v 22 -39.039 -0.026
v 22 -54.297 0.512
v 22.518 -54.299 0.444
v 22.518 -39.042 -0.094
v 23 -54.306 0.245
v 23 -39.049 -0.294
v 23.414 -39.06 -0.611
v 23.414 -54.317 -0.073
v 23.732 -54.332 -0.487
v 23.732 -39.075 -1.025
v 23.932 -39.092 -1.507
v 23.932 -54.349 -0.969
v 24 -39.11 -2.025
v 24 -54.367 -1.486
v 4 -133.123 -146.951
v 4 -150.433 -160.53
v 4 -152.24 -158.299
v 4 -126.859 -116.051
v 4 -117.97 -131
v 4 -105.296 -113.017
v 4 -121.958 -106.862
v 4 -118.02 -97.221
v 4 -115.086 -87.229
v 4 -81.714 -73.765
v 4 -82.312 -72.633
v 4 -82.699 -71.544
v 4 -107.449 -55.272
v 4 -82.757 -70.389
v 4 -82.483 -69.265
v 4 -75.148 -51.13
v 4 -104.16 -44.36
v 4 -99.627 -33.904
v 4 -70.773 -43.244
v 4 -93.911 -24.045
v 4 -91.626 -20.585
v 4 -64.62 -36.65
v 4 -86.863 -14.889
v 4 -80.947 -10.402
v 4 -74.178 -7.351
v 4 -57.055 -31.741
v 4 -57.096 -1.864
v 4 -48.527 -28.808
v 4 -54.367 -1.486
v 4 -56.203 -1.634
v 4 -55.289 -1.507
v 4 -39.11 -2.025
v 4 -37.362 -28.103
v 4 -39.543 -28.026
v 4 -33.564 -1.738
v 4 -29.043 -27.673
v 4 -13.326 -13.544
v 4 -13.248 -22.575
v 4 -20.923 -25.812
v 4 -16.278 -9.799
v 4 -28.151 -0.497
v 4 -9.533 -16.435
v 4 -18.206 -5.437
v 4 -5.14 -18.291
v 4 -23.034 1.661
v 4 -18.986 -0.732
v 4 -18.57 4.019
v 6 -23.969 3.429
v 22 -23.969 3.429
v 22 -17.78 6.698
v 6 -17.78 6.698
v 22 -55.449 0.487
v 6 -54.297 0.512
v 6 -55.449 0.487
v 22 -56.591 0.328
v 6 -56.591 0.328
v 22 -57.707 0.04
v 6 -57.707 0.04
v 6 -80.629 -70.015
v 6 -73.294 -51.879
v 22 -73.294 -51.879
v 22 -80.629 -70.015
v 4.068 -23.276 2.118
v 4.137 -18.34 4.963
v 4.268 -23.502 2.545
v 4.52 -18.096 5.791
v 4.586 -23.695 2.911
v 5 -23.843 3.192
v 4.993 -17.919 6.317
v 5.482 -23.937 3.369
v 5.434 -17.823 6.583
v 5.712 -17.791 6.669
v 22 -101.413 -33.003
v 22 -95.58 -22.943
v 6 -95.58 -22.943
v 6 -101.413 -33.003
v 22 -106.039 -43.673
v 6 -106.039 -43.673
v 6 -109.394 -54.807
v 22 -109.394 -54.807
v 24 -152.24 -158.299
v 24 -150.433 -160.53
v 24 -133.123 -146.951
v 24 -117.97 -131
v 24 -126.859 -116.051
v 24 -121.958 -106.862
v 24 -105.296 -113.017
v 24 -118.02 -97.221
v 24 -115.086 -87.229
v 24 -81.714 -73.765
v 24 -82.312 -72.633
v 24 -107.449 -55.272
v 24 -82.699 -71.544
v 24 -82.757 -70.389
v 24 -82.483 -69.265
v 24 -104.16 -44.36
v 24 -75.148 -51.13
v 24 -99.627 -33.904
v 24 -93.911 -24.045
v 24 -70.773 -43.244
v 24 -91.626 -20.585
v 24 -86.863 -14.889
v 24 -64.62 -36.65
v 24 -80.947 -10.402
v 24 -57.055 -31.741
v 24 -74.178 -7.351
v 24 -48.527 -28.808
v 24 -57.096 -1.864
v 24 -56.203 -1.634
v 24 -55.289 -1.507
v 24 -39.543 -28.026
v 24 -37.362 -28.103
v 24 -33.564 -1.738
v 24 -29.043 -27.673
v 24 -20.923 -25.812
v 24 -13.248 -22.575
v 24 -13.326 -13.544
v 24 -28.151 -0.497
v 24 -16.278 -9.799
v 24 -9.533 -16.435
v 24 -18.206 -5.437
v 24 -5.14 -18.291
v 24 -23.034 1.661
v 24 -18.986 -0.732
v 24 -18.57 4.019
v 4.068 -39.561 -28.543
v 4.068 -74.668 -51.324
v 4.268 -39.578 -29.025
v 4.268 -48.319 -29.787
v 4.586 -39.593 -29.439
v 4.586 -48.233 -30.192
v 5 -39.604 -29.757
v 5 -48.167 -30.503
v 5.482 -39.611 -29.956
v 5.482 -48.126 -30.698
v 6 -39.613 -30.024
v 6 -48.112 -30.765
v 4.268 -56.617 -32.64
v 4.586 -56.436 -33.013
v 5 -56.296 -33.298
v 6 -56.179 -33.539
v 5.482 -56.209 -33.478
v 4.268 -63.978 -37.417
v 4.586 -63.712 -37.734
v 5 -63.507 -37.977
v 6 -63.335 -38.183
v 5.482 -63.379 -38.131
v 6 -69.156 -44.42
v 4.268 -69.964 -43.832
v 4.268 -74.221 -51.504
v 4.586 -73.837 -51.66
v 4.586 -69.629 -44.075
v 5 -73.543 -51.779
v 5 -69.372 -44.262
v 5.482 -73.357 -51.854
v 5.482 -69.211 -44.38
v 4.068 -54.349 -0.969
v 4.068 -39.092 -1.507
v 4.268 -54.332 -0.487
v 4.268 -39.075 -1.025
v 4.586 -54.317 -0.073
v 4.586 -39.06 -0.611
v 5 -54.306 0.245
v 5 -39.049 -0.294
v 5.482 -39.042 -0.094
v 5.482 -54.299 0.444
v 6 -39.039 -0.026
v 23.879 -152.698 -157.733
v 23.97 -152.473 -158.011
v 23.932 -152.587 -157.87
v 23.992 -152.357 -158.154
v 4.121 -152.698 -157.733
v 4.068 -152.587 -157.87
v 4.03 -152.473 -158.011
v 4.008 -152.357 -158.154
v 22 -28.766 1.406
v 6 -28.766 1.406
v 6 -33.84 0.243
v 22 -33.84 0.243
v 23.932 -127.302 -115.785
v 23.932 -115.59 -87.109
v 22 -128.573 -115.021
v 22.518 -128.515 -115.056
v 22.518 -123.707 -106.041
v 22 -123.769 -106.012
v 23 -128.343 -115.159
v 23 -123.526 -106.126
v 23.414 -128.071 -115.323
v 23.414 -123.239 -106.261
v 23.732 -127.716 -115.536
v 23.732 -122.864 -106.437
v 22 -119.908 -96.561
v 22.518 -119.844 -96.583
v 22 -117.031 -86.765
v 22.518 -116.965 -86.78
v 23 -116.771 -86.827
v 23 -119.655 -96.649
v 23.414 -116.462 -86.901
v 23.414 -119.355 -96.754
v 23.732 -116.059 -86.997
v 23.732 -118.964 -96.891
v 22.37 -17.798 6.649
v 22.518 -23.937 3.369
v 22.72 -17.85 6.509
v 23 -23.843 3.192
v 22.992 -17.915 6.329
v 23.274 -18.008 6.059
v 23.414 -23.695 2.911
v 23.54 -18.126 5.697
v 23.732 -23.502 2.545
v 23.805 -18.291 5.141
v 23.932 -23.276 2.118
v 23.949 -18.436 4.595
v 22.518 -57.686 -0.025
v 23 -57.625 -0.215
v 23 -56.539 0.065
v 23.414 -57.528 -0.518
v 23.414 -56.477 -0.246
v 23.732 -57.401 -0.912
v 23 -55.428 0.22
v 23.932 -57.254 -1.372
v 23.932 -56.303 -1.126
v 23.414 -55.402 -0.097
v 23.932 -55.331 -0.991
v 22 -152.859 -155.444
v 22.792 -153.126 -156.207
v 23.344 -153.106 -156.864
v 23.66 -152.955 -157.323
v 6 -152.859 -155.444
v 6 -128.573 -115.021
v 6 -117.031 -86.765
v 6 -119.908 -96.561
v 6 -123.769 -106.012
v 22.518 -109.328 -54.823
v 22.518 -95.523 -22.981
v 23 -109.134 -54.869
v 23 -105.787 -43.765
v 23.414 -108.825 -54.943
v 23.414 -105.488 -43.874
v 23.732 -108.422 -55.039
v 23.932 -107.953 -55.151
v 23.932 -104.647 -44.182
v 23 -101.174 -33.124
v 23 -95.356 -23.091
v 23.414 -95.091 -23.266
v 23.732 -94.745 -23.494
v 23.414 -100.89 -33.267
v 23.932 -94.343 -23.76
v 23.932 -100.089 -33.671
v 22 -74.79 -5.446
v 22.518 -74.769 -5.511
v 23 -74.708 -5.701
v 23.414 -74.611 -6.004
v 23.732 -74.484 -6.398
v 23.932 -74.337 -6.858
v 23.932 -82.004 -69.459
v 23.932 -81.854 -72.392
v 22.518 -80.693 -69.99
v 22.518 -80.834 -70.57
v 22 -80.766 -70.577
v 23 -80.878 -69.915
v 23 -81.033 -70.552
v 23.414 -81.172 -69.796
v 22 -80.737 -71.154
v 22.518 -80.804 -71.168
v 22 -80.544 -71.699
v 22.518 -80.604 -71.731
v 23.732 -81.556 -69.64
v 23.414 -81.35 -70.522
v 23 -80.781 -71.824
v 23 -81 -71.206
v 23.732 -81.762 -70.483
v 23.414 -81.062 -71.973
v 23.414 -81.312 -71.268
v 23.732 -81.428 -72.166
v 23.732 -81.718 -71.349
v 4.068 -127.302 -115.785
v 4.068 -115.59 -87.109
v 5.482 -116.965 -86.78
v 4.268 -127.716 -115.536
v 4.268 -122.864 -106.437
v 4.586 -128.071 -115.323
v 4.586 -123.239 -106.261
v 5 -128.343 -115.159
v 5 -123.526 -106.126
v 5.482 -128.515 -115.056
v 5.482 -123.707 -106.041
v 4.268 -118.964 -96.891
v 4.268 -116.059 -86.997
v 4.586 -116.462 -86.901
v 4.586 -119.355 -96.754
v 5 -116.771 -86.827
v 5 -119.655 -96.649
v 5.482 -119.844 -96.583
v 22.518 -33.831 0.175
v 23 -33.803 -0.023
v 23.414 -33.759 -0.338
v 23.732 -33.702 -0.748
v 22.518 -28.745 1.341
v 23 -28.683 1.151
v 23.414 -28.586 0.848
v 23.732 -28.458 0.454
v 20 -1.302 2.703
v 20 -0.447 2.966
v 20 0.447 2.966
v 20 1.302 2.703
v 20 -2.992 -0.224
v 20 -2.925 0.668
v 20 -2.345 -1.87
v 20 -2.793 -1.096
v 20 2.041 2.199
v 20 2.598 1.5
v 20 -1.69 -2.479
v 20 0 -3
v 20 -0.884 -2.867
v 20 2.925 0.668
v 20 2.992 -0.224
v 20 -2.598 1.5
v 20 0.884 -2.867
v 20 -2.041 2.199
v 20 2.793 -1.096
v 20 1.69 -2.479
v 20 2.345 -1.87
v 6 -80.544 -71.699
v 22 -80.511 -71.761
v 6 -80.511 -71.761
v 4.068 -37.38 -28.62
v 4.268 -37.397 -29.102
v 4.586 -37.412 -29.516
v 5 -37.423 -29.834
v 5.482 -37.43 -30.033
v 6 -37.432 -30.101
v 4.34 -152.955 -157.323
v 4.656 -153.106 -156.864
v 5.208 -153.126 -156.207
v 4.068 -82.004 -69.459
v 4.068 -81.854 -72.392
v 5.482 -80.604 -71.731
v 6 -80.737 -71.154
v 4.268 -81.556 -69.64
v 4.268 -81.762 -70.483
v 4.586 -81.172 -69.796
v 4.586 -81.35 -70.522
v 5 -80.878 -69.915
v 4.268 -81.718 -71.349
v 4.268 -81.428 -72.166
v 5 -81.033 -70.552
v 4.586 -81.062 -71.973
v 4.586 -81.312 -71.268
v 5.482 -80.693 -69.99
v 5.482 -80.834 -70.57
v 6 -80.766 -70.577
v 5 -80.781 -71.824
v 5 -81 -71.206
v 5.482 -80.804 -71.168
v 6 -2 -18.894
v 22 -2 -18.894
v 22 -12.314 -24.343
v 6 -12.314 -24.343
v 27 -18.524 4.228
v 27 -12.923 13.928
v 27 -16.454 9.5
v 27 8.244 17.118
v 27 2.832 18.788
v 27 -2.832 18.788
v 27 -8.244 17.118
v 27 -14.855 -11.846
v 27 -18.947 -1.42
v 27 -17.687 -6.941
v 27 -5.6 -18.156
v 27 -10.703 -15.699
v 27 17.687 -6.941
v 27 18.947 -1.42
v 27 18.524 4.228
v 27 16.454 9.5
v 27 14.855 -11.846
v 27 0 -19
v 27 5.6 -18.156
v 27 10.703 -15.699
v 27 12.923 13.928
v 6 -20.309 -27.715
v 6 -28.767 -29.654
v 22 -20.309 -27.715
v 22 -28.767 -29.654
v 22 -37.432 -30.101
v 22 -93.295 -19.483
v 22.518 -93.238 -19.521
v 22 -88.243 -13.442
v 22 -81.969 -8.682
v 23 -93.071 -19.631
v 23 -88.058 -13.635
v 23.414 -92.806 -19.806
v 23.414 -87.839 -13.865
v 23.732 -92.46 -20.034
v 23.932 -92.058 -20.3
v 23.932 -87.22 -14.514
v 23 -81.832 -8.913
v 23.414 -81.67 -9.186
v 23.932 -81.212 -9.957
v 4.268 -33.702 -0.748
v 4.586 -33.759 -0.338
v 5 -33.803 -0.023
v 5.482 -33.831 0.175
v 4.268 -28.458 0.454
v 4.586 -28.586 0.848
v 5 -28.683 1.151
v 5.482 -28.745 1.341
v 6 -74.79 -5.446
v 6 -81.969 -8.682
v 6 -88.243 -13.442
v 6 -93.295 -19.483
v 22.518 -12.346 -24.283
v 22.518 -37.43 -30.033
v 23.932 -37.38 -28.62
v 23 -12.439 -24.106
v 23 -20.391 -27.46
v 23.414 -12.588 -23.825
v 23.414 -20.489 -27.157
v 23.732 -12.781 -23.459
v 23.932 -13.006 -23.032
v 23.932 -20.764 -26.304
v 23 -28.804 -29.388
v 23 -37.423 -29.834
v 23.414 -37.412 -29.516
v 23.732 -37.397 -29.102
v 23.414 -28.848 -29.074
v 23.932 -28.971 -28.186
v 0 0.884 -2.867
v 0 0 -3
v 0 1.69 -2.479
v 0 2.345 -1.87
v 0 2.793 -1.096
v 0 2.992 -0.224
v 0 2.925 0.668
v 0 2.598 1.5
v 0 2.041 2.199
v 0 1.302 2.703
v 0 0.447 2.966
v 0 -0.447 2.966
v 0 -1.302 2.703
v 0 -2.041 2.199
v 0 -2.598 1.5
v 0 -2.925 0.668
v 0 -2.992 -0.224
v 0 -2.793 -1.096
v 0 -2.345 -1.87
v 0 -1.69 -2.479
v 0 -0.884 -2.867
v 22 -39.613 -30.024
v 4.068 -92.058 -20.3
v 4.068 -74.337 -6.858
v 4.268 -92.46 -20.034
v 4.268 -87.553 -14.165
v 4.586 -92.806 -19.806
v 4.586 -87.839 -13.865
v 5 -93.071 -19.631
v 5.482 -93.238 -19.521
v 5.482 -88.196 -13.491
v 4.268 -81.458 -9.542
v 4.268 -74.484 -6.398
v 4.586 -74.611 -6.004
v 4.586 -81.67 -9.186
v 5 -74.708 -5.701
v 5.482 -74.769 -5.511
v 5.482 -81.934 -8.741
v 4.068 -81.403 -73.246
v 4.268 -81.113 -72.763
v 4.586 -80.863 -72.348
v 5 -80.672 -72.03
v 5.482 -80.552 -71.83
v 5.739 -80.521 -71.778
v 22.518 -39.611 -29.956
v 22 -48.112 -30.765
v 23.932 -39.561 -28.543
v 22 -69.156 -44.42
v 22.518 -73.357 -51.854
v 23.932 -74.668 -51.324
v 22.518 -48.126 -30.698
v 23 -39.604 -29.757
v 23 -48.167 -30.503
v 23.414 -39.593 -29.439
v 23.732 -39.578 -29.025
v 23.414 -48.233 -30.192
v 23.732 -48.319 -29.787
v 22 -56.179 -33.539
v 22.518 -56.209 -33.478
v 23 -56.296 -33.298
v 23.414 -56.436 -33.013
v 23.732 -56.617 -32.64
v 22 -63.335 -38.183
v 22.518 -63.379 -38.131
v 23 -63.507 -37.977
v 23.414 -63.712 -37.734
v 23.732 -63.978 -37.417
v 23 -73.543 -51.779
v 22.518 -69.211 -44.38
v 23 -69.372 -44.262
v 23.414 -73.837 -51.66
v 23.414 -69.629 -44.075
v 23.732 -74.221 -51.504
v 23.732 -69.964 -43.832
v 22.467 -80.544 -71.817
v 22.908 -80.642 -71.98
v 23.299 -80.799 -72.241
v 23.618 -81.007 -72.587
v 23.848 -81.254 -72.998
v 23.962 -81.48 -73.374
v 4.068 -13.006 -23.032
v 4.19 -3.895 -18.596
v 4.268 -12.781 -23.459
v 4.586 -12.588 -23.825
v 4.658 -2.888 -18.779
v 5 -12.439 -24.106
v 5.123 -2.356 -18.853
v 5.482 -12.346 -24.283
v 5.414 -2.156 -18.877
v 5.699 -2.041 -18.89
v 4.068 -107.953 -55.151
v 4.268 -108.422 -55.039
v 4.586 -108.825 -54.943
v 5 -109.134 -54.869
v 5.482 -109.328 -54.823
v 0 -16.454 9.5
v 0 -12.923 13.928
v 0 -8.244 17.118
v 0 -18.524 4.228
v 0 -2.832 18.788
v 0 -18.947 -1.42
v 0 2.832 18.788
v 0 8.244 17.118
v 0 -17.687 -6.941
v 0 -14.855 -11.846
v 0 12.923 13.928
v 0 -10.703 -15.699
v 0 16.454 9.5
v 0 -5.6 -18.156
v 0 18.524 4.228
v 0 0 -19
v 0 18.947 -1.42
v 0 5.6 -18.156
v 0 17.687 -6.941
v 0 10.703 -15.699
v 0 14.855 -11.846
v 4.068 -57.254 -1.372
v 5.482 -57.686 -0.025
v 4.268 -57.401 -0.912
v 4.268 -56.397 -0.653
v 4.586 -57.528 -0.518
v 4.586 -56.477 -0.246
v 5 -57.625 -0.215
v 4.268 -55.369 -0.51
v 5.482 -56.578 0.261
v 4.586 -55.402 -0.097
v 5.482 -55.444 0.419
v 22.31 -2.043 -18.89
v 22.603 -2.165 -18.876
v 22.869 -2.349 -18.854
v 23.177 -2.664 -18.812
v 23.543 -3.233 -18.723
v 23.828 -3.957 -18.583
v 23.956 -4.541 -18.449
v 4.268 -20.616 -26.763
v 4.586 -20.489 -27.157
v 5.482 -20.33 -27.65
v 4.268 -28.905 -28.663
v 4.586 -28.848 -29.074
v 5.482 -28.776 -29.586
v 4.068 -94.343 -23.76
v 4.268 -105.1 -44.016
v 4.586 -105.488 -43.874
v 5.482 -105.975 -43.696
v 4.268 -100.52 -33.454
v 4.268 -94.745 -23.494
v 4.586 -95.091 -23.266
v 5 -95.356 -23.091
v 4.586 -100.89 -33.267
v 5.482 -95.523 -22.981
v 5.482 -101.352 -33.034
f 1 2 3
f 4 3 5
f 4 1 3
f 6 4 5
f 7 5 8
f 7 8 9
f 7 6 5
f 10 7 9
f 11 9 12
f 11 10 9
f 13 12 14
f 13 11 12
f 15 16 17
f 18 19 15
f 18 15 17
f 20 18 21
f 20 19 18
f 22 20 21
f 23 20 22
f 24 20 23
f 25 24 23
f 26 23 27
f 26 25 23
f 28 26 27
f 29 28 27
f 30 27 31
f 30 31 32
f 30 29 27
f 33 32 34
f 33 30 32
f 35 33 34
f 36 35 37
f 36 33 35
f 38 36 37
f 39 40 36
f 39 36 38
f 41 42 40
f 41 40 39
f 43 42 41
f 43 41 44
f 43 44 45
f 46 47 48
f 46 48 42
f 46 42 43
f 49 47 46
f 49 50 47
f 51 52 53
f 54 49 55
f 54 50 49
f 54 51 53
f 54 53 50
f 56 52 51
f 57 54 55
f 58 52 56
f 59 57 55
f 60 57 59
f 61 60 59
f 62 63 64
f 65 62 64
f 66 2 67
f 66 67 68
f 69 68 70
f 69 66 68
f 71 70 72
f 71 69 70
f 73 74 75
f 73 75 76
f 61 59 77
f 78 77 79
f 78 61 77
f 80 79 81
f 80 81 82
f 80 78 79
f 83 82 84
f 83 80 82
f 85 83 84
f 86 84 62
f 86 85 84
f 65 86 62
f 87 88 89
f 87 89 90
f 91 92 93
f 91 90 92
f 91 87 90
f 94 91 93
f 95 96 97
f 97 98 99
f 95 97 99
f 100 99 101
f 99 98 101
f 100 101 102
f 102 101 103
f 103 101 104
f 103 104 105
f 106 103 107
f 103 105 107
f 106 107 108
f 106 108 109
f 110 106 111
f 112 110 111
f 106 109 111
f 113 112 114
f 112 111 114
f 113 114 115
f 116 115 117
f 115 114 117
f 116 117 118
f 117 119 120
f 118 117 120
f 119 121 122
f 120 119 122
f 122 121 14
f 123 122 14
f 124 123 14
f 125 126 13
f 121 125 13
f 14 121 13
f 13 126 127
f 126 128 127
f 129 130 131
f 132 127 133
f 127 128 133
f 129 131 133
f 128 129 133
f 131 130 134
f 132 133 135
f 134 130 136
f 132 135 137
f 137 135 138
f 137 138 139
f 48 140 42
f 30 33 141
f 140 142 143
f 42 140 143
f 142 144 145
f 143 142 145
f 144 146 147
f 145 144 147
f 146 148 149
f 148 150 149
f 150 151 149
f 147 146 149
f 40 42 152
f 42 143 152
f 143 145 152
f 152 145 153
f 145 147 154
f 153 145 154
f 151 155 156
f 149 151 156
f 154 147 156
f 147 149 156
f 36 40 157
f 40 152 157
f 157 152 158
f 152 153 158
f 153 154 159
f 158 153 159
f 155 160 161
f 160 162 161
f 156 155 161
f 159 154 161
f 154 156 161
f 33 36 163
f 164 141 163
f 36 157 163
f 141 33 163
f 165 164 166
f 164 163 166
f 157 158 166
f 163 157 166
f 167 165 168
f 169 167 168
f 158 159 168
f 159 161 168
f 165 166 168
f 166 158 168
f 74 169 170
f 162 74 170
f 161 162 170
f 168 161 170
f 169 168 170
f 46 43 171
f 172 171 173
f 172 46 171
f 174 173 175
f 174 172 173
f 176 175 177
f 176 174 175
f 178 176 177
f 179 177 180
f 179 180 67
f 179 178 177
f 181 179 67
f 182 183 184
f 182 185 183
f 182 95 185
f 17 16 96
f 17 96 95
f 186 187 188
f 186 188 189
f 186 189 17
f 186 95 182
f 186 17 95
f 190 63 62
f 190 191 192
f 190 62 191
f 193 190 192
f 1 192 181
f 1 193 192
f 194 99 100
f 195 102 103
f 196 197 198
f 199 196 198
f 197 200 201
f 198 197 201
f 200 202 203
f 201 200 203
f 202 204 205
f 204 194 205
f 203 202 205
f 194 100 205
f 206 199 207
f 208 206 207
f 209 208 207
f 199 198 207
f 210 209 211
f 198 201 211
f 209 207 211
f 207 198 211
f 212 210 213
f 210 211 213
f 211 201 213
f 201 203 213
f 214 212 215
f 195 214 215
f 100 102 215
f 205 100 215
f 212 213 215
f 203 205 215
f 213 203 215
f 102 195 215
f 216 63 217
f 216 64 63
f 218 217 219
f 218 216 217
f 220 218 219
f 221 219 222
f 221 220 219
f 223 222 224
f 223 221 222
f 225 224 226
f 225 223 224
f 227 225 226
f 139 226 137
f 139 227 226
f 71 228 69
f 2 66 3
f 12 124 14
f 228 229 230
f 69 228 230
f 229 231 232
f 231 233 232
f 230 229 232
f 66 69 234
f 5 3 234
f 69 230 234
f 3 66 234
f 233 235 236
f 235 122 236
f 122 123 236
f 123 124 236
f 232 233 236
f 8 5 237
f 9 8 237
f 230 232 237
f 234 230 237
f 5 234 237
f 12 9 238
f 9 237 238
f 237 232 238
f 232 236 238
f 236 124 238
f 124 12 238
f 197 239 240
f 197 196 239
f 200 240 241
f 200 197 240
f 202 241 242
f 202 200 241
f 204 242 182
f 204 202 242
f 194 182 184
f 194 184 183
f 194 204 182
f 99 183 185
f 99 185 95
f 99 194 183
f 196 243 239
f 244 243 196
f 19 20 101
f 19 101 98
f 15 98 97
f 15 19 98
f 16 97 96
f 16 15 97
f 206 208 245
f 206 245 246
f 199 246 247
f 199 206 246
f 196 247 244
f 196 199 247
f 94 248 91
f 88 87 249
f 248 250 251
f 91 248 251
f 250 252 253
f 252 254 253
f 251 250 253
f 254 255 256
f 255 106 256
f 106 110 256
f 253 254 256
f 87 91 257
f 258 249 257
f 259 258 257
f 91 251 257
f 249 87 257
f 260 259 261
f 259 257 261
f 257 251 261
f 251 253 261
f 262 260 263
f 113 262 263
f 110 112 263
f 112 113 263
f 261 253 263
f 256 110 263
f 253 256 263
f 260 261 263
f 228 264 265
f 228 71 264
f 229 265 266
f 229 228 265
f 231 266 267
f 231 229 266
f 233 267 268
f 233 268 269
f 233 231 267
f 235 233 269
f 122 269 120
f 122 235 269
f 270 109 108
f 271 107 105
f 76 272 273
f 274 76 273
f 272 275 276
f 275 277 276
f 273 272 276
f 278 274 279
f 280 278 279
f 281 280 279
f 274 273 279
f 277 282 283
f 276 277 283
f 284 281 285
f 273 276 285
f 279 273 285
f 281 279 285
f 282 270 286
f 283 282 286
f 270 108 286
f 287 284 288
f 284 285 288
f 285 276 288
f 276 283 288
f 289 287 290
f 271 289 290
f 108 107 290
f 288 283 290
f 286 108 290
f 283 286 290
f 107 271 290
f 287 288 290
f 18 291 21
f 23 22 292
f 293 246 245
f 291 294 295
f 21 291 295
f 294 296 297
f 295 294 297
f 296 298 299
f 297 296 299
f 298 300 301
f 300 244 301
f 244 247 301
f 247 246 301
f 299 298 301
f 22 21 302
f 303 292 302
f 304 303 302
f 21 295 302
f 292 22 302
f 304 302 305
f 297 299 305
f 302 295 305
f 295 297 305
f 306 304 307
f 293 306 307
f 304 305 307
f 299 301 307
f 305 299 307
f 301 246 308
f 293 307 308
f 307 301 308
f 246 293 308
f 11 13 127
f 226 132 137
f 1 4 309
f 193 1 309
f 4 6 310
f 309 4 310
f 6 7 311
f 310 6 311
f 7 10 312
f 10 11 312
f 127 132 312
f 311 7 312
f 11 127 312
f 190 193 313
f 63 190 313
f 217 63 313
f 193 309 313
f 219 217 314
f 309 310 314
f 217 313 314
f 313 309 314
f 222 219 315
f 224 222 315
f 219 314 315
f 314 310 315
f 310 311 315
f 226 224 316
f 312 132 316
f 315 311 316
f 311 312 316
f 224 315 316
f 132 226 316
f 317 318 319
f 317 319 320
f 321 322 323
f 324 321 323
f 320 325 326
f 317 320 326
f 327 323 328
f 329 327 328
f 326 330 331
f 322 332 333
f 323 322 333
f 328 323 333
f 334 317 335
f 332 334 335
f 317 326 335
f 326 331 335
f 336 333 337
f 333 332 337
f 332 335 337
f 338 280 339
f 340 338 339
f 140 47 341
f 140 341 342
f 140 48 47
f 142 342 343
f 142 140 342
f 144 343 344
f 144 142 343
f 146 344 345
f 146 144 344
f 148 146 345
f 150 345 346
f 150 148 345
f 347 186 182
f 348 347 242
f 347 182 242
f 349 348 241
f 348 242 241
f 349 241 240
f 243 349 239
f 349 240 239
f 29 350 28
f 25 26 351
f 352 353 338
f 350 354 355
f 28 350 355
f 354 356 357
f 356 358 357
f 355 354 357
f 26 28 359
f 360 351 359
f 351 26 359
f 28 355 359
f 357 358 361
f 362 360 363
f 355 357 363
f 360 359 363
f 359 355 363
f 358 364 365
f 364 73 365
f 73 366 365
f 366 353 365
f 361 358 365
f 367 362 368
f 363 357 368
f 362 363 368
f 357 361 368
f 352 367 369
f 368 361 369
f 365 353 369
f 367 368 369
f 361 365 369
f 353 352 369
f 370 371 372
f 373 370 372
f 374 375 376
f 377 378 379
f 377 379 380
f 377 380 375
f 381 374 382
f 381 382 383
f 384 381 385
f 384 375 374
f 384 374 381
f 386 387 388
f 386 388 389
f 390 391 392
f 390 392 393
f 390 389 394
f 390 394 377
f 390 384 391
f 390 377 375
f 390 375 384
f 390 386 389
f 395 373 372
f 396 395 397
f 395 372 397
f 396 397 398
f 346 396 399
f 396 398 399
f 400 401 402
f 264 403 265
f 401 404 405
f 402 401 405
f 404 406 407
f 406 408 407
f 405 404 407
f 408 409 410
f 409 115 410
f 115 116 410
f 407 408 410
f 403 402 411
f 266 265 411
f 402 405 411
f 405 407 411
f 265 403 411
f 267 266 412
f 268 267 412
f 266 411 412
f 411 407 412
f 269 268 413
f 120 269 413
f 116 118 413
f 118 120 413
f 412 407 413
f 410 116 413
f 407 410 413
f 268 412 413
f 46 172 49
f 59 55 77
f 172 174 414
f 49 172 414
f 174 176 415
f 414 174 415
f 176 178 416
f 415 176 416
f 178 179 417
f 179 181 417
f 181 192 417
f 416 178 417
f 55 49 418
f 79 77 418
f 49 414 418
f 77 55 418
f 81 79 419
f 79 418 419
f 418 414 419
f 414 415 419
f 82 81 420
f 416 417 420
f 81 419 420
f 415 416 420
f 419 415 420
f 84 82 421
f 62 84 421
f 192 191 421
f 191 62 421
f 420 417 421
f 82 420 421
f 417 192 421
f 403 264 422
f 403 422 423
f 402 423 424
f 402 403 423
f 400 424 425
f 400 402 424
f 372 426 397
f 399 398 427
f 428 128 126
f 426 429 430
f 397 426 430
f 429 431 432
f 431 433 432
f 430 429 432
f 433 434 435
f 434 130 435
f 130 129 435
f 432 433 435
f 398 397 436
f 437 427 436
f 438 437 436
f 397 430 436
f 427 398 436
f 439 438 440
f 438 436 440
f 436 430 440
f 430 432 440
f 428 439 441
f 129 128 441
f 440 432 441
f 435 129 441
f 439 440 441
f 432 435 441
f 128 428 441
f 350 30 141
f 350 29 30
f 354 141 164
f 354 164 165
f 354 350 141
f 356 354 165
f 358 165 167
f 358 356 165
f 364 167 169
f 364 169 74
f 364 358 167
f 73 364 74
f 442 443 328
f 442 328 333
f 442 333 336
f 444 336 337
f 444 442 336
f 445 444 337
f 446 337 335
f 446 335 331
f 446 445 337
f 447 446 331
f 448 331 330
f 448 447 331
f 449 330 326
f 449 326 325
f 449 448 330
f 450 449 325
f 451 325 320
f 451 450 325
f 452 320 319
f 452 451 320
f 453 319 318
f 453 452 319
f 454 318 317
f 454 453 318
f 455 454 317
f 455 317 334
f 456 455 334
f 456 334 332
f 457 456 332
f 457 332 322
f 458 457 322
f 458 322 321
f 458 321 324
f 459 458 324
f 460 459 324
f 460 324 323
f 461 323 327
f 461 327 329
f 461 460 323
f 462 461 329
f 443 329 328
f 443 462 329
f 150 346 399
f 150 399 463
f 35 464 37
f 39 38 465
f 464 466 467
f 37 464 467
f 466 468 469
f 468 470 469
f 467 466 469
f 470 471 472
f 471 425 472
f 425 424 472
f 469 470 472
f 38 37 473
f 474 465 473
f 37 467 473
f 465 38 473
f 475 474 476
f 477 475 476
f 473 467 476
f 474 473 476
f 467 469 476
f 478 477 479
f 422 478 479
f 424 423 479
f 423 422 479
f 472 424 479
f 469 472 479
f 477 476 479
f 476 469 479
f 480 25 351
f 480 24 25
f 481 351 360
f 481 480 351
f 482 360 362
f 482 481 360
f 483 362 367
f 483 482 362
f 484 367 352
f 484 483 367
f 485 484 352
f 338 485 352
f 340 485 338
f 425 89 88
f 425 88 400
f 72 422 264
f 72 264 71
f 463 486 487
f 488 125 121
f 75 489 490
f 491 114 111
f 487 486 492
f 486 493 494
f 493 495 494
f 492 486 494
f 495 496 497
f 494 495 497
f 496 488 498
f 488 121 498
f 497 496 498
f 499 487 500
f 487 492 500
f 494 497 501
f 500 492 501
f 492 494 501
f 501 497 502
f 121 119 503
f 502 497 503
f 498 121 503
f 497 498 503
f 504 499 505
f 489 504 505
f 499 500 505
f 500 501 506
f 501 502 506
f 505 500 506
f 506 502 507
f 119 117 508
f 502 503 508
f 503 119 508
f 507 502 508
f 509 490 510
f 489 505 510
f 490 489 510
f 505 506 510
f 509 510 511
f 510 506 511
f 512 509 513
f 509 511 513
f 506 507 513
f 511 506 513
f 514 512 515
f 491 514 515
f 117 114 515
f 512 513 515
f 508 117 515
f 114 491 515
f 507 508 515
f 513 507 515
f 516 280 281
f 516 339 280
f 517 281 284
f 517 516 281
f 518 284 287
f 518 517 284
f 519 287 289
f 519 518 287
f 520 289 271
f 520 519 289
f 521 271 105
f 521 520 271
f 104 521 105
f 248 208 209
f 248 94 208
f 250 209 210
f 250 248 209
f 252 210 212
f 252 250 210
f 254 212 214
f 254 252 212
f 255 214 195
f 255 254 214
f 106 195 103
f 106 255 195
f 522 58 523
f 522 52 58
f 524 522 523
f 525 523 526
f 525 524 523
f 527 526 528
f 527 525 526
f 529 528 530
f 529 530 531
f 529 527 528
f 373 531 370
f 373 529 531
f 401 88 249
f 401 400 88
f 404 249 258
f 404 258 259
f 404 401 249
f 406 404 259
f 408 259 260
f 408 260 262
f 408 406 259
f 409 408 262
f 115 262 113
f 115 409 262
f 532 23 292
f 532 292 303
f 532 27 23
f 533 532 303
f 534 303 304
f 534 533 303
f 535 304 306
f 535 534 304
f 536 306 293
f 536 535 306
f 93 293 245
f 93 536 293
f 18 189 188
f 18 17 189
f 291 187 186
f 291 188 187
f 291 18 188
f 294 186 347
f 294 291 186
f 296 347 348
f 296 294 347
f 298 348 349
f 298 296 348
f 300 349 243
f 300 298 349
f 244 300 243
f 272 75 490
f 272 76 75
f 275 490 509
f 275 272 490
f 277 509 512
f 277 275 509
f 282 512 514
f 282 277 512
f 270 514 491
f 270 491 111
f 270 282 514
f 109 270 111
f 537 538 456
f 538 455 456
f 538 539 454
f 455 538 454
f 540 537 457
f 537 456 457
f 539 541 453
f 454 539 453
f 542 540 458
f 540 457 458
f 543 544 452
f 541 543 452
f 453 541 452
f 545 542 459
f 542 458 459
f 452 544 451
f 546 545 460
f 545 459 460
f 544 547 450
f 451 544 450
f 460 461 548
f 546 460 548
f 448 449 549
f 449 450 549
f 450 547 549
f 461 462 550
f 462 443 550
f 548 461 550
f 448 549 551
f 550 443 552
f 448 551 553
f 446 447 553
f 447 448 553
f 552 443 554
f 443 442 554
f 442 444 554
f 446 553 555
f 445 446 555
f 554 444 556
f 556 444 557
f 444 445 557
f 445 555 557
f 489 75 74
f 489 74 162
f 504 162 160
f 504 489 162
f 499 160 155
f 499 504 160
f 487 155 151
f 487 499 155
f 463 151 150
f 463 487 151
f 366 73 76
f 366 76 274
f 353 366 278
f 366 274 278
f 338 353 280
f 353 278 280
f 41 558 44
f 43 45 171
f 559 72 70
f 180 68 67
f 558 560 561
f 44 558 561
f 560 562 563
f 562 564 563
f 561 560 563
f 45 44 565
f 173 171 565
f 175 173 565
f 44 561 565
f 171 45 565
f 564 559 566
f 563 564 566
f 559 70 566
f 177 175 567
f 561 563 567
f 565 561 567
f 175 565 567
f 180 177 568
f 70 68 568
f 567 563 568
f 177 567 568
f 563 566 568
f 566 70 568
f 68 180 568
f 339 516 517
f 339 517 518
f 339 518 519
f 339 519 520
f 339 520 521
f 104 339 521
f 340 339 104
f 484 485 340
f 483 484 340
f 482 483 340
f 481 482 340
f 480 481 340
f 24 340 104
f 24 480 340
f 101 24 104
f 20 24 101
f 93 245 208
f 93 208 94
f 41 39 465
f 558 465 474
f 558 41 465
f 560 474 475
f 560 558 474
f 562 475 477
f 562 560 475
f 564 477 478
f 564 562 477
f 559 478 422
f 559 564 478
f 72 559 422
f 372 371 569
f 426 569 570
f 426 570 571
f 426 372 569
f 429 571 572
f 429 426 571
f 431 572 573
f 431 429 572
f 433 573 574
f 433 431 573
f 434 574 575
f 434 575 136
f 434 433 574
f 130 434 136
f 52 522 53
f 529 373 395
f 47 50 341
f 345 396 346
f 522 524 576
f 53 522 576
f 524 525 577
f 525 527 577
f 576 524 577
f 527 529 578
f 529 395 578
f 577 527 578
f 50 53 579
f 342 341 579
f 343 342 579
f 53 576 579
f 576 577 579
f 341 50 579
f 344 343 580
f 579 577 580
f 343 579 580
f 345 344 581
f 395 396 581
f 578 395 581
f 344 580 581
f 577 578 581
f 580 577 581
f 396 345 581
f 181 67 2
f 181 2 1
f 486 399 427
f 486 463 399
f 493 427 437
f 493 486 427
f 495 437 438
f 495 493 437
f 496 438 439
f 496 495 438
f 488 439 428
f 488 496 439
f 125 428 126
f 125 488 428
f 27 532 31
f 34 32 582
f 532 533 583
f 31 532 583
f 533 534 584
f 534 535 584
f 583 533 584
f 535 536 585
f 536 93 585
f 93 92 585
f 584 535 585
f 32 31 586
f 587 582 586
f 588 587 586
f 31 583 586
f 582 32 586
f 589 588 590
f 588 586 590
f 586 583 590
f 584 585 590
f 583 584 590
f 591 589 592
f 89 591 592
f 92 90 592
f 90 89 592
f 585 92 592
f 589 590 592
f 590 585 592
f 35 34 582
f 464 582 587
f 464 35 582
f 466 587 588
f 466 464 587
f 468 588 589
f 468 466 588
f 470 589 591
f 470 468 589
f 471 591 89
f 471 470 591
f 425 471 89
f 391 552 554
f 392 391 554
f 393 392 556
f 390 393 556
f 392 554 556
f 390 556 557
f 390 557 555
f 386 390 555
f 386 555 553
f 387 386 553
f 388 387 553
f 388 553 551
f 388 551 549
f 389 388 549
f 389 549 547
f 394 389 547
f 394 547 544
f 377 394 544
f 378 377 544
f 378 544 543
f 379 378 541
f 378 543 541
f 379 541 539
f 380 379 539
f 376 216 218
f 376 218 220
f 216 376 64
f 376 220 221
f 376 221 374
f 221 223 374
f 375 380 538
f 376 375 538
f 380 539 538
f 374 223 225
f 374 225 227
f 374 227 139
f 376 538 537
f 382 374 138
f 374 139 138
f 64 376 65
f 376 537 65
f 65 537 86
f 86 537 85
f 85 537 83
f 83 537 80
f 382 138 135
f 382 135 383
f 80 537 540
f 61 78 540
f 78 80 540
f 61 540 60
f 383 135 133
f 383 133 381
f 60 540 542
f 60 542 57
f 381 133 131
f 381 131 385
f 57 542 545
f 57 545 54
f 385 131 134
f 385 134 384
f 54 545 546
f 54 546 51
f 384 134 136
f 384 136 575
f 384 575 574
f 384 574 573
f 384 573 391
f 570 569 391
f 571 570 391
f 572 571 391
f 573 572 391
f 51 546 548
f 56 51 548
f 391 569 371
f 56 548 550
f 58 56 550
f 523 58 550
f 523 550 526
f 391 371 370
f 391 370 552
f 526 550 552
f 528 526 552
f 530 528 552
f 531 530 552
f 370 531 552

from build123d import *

# Parameters (mm, degrees)
SKETCH1_R           = 19
BOSS_EXTRUDE1_DEPTH = 27
CUT_EXTRUDE1_START  = -27
SKETCH2_R           = 3
CUT_EXTRUDE1_DEPTH  = 20
BOSS_EXTRUDE2_START = 4
BOSS_EXTRUDE2_DEPTH = 20
FILLET1_R           = 50
FILLET2_R           = 30
FILLET3_R           = 10
FILLET4_R           = 35
FILLET5_R           = 100
FILLET6_R           = 35
FILLET7_R           = 2
FILLET8_R           = 2


with BuildPart() as part:
    # Sketch1 → Boss-Extrude1 (new body)
    with BuildSketch(Plane(origin=(0, 0, 0), x_dir=(0, 0, -1), z_dir=(1, 0, 0))):
        Circle(SKETCH1_R)
    extrude(amount=BOSS_EXTRUDE1_DEPTH)

    # Sketch2 → Cut-Extrude1 (cut)
    with BuildSketch(Plane(origin=(27, 0, 0), x_dir=(0, 0, -1), z_dir=(1, 0, 0)).offset(CUT_EXTRUDE1_START)):
        Circle(SKETCH2_R)
    extrude(amount=CUT_EXTRUDE1_DEPTH, mode=Mode.SUBTRACT)

    # Sketch3 → Boss-Extrude2 (add)
    with BuildSketch(Plane(origin=(0, 0, 0), x_dir=(0, 0, -1), z_dir=(1, 0, 0)).offset(BOSS_EXTRUDE2_START)):
        with BuildLine():
            Line((18.894443628, -2), (30.571757329, -24.105210805))
            Line((30.571757329, -24.105210805), (29.160101789, -64.105210805))
            Line((29.160101789, -64.105210805), (70.877132442, -80.977950757))
            Line((70.877132442, -80.977950757), (71.761340874, -80.510858209))
            Line((71.761340874, -80.510858209), (113.01650789, -105.296253694))
            ThreePointArc((113.01650789, -105.296253694), (139.2516778, -125.255736415), (160.530160786, -150.432933488))
            Line((160.530160786, -150.432933488), (156.644610862, -153.579757568))
            Line((156.644610862, -153.579757568), (101.784019397, -120.620456846))
            Line((101.784019397, -120.620456846), (37.657121196, -105.296253694))
            Line((37.657121196, -105.296253694), (9.210363464, -86.510744513))
            Line((9.210363464, -86.510744513), (-0.574058656, -56.0433015))
            Line((-0.574058656, -56.0433015), (0.308226057, -31.0433015))
            Line((0.308226057, -31.0433015), (-6.698162164, -17.780175017))
            Line((-6.698162164, -17.780175017), (18.894443628, -2))
        make_face()
    extrude(amount=BOSS_EXTRUDE2_DEPTH)

    # Fillet1
    fillet1_edges = [part.edges().sort_by_distance(p)[0] for p in [
        (14, -24.105210805, -30.571757329),
    ]]
    fillet(fillet1_edges, radius=FILLET1_R)

    # Fillet2
    fillet2_edges = [part.edges().sort_by_distance(p)[0] for p in [
        (14, -31.0433015, -0.308226057),
    ]]
    fillet(fillet2_edges, radius=FILLET2_R)

    # Fillet3
    fillet3_edges = [part.edges().sort_by_distance(p)[0] for p in [
        (14, -56.0433015, 0.574058656),
    ]]
    fillet(fillet3_edges, radius=FILLET3_R)

    # Fillet4
    fillet4_edges = [part.edges().sort_by_distance(p)[0] for p in [
        (14, -86.510744513, -9.210363464),
    ]]
    fillet(fillet4_edges, radius=FILLET4_R)

    # Fillet5
    fillet5_edges = [part.edges().sort_by_distance(p)[0] for p in [
        (14, -105.296253694, -37.657121196),
        (14, -120.620456846, -101.784019397),
    ]]
    fillet(fillet5_edges, radius=FILLET5_R)

    # Fillet6
    fillet6_edges = [part.edges().sort_by_distance(p)[0] for p in [
        (14, -64.105210805, -29.160101789),
    ]]
    fillet(fillet6_edges, radius=FILLET6_R)

    # Fillet7
    fillet7_edges = [part.edges().sort_by_distance(p)[0] for p in [
        (14, -80.977950757, -70.877132442),
    ]]
    fillet(fillet7_edges, radius=FILLET7_R)

    # Fillet8
    fillet8_edges = [part.edges().sort_by_distance(p)[0] for p in [
        (4, -20.874395385, 5.063607207),
        (14, -153.579757568, -156.644610862),
        (4, -80.527255596, -71.730300543),
        (24, -20.874395385, 5.063607207),
        (24, -80.527255596, -71.730300543),
        (4, -7.157033947, -21.61870189),
        (24, -7.157033947, -21.61870189),
        (4, -24.495759346, -28.868208254),
        (24, -24.495759346, -28.868208254),
        (4, -46.668154937, 0.243196716),
        (24, -46.668154937, 0.243196716),
        (4, -31.277630624, 0.713903389),
        (24, -31.277630624, 0.713903389),
        (4, -66.24854061, -2.70328783),
        (24, -66.24854061, -2.70328783),
        (4, -56.022494361, 0.423944925),
        (24, -56.022494361, 0.423944925),
        (4, -94.437046571, -21.213104097),
        (24, -94.437046571, -21.213104097),
        (4, -85.240499997, -10.884930764),
        (24, -85.240499997, -10.884930764),
        (4, -141.076434231, -135.832891606),
        (24, -141.076434231, -135.832891606),
        (4, -113.212895767, -70.785741018),
        (24, -113.212895767, -70.785741018),
        (4, -103.880894632, -38.270767893),
        (24, -103.880894632, -38.270767893),
        (4, -121.717757742, -101.335811711),
        (24, -121.717757742, -101.335811711),
        (4, -38.522680641, -30.0629448),
        (24, -38.522680641, -30.0629448),
        (4, -59.899123869, -35.642159411),
        (24, -59.899123869, -35.642159411),
        (4, -76.961765139, -60.947308417),
        (24, -76.961765139, -60.947308417),
        (4, -80.772653132, -70.866688464),
        (24, -80.772653132, -70.866688464),
    ]]
    fillet(fillet8_edges, radius=FILLET8_R)


solid = part.part
